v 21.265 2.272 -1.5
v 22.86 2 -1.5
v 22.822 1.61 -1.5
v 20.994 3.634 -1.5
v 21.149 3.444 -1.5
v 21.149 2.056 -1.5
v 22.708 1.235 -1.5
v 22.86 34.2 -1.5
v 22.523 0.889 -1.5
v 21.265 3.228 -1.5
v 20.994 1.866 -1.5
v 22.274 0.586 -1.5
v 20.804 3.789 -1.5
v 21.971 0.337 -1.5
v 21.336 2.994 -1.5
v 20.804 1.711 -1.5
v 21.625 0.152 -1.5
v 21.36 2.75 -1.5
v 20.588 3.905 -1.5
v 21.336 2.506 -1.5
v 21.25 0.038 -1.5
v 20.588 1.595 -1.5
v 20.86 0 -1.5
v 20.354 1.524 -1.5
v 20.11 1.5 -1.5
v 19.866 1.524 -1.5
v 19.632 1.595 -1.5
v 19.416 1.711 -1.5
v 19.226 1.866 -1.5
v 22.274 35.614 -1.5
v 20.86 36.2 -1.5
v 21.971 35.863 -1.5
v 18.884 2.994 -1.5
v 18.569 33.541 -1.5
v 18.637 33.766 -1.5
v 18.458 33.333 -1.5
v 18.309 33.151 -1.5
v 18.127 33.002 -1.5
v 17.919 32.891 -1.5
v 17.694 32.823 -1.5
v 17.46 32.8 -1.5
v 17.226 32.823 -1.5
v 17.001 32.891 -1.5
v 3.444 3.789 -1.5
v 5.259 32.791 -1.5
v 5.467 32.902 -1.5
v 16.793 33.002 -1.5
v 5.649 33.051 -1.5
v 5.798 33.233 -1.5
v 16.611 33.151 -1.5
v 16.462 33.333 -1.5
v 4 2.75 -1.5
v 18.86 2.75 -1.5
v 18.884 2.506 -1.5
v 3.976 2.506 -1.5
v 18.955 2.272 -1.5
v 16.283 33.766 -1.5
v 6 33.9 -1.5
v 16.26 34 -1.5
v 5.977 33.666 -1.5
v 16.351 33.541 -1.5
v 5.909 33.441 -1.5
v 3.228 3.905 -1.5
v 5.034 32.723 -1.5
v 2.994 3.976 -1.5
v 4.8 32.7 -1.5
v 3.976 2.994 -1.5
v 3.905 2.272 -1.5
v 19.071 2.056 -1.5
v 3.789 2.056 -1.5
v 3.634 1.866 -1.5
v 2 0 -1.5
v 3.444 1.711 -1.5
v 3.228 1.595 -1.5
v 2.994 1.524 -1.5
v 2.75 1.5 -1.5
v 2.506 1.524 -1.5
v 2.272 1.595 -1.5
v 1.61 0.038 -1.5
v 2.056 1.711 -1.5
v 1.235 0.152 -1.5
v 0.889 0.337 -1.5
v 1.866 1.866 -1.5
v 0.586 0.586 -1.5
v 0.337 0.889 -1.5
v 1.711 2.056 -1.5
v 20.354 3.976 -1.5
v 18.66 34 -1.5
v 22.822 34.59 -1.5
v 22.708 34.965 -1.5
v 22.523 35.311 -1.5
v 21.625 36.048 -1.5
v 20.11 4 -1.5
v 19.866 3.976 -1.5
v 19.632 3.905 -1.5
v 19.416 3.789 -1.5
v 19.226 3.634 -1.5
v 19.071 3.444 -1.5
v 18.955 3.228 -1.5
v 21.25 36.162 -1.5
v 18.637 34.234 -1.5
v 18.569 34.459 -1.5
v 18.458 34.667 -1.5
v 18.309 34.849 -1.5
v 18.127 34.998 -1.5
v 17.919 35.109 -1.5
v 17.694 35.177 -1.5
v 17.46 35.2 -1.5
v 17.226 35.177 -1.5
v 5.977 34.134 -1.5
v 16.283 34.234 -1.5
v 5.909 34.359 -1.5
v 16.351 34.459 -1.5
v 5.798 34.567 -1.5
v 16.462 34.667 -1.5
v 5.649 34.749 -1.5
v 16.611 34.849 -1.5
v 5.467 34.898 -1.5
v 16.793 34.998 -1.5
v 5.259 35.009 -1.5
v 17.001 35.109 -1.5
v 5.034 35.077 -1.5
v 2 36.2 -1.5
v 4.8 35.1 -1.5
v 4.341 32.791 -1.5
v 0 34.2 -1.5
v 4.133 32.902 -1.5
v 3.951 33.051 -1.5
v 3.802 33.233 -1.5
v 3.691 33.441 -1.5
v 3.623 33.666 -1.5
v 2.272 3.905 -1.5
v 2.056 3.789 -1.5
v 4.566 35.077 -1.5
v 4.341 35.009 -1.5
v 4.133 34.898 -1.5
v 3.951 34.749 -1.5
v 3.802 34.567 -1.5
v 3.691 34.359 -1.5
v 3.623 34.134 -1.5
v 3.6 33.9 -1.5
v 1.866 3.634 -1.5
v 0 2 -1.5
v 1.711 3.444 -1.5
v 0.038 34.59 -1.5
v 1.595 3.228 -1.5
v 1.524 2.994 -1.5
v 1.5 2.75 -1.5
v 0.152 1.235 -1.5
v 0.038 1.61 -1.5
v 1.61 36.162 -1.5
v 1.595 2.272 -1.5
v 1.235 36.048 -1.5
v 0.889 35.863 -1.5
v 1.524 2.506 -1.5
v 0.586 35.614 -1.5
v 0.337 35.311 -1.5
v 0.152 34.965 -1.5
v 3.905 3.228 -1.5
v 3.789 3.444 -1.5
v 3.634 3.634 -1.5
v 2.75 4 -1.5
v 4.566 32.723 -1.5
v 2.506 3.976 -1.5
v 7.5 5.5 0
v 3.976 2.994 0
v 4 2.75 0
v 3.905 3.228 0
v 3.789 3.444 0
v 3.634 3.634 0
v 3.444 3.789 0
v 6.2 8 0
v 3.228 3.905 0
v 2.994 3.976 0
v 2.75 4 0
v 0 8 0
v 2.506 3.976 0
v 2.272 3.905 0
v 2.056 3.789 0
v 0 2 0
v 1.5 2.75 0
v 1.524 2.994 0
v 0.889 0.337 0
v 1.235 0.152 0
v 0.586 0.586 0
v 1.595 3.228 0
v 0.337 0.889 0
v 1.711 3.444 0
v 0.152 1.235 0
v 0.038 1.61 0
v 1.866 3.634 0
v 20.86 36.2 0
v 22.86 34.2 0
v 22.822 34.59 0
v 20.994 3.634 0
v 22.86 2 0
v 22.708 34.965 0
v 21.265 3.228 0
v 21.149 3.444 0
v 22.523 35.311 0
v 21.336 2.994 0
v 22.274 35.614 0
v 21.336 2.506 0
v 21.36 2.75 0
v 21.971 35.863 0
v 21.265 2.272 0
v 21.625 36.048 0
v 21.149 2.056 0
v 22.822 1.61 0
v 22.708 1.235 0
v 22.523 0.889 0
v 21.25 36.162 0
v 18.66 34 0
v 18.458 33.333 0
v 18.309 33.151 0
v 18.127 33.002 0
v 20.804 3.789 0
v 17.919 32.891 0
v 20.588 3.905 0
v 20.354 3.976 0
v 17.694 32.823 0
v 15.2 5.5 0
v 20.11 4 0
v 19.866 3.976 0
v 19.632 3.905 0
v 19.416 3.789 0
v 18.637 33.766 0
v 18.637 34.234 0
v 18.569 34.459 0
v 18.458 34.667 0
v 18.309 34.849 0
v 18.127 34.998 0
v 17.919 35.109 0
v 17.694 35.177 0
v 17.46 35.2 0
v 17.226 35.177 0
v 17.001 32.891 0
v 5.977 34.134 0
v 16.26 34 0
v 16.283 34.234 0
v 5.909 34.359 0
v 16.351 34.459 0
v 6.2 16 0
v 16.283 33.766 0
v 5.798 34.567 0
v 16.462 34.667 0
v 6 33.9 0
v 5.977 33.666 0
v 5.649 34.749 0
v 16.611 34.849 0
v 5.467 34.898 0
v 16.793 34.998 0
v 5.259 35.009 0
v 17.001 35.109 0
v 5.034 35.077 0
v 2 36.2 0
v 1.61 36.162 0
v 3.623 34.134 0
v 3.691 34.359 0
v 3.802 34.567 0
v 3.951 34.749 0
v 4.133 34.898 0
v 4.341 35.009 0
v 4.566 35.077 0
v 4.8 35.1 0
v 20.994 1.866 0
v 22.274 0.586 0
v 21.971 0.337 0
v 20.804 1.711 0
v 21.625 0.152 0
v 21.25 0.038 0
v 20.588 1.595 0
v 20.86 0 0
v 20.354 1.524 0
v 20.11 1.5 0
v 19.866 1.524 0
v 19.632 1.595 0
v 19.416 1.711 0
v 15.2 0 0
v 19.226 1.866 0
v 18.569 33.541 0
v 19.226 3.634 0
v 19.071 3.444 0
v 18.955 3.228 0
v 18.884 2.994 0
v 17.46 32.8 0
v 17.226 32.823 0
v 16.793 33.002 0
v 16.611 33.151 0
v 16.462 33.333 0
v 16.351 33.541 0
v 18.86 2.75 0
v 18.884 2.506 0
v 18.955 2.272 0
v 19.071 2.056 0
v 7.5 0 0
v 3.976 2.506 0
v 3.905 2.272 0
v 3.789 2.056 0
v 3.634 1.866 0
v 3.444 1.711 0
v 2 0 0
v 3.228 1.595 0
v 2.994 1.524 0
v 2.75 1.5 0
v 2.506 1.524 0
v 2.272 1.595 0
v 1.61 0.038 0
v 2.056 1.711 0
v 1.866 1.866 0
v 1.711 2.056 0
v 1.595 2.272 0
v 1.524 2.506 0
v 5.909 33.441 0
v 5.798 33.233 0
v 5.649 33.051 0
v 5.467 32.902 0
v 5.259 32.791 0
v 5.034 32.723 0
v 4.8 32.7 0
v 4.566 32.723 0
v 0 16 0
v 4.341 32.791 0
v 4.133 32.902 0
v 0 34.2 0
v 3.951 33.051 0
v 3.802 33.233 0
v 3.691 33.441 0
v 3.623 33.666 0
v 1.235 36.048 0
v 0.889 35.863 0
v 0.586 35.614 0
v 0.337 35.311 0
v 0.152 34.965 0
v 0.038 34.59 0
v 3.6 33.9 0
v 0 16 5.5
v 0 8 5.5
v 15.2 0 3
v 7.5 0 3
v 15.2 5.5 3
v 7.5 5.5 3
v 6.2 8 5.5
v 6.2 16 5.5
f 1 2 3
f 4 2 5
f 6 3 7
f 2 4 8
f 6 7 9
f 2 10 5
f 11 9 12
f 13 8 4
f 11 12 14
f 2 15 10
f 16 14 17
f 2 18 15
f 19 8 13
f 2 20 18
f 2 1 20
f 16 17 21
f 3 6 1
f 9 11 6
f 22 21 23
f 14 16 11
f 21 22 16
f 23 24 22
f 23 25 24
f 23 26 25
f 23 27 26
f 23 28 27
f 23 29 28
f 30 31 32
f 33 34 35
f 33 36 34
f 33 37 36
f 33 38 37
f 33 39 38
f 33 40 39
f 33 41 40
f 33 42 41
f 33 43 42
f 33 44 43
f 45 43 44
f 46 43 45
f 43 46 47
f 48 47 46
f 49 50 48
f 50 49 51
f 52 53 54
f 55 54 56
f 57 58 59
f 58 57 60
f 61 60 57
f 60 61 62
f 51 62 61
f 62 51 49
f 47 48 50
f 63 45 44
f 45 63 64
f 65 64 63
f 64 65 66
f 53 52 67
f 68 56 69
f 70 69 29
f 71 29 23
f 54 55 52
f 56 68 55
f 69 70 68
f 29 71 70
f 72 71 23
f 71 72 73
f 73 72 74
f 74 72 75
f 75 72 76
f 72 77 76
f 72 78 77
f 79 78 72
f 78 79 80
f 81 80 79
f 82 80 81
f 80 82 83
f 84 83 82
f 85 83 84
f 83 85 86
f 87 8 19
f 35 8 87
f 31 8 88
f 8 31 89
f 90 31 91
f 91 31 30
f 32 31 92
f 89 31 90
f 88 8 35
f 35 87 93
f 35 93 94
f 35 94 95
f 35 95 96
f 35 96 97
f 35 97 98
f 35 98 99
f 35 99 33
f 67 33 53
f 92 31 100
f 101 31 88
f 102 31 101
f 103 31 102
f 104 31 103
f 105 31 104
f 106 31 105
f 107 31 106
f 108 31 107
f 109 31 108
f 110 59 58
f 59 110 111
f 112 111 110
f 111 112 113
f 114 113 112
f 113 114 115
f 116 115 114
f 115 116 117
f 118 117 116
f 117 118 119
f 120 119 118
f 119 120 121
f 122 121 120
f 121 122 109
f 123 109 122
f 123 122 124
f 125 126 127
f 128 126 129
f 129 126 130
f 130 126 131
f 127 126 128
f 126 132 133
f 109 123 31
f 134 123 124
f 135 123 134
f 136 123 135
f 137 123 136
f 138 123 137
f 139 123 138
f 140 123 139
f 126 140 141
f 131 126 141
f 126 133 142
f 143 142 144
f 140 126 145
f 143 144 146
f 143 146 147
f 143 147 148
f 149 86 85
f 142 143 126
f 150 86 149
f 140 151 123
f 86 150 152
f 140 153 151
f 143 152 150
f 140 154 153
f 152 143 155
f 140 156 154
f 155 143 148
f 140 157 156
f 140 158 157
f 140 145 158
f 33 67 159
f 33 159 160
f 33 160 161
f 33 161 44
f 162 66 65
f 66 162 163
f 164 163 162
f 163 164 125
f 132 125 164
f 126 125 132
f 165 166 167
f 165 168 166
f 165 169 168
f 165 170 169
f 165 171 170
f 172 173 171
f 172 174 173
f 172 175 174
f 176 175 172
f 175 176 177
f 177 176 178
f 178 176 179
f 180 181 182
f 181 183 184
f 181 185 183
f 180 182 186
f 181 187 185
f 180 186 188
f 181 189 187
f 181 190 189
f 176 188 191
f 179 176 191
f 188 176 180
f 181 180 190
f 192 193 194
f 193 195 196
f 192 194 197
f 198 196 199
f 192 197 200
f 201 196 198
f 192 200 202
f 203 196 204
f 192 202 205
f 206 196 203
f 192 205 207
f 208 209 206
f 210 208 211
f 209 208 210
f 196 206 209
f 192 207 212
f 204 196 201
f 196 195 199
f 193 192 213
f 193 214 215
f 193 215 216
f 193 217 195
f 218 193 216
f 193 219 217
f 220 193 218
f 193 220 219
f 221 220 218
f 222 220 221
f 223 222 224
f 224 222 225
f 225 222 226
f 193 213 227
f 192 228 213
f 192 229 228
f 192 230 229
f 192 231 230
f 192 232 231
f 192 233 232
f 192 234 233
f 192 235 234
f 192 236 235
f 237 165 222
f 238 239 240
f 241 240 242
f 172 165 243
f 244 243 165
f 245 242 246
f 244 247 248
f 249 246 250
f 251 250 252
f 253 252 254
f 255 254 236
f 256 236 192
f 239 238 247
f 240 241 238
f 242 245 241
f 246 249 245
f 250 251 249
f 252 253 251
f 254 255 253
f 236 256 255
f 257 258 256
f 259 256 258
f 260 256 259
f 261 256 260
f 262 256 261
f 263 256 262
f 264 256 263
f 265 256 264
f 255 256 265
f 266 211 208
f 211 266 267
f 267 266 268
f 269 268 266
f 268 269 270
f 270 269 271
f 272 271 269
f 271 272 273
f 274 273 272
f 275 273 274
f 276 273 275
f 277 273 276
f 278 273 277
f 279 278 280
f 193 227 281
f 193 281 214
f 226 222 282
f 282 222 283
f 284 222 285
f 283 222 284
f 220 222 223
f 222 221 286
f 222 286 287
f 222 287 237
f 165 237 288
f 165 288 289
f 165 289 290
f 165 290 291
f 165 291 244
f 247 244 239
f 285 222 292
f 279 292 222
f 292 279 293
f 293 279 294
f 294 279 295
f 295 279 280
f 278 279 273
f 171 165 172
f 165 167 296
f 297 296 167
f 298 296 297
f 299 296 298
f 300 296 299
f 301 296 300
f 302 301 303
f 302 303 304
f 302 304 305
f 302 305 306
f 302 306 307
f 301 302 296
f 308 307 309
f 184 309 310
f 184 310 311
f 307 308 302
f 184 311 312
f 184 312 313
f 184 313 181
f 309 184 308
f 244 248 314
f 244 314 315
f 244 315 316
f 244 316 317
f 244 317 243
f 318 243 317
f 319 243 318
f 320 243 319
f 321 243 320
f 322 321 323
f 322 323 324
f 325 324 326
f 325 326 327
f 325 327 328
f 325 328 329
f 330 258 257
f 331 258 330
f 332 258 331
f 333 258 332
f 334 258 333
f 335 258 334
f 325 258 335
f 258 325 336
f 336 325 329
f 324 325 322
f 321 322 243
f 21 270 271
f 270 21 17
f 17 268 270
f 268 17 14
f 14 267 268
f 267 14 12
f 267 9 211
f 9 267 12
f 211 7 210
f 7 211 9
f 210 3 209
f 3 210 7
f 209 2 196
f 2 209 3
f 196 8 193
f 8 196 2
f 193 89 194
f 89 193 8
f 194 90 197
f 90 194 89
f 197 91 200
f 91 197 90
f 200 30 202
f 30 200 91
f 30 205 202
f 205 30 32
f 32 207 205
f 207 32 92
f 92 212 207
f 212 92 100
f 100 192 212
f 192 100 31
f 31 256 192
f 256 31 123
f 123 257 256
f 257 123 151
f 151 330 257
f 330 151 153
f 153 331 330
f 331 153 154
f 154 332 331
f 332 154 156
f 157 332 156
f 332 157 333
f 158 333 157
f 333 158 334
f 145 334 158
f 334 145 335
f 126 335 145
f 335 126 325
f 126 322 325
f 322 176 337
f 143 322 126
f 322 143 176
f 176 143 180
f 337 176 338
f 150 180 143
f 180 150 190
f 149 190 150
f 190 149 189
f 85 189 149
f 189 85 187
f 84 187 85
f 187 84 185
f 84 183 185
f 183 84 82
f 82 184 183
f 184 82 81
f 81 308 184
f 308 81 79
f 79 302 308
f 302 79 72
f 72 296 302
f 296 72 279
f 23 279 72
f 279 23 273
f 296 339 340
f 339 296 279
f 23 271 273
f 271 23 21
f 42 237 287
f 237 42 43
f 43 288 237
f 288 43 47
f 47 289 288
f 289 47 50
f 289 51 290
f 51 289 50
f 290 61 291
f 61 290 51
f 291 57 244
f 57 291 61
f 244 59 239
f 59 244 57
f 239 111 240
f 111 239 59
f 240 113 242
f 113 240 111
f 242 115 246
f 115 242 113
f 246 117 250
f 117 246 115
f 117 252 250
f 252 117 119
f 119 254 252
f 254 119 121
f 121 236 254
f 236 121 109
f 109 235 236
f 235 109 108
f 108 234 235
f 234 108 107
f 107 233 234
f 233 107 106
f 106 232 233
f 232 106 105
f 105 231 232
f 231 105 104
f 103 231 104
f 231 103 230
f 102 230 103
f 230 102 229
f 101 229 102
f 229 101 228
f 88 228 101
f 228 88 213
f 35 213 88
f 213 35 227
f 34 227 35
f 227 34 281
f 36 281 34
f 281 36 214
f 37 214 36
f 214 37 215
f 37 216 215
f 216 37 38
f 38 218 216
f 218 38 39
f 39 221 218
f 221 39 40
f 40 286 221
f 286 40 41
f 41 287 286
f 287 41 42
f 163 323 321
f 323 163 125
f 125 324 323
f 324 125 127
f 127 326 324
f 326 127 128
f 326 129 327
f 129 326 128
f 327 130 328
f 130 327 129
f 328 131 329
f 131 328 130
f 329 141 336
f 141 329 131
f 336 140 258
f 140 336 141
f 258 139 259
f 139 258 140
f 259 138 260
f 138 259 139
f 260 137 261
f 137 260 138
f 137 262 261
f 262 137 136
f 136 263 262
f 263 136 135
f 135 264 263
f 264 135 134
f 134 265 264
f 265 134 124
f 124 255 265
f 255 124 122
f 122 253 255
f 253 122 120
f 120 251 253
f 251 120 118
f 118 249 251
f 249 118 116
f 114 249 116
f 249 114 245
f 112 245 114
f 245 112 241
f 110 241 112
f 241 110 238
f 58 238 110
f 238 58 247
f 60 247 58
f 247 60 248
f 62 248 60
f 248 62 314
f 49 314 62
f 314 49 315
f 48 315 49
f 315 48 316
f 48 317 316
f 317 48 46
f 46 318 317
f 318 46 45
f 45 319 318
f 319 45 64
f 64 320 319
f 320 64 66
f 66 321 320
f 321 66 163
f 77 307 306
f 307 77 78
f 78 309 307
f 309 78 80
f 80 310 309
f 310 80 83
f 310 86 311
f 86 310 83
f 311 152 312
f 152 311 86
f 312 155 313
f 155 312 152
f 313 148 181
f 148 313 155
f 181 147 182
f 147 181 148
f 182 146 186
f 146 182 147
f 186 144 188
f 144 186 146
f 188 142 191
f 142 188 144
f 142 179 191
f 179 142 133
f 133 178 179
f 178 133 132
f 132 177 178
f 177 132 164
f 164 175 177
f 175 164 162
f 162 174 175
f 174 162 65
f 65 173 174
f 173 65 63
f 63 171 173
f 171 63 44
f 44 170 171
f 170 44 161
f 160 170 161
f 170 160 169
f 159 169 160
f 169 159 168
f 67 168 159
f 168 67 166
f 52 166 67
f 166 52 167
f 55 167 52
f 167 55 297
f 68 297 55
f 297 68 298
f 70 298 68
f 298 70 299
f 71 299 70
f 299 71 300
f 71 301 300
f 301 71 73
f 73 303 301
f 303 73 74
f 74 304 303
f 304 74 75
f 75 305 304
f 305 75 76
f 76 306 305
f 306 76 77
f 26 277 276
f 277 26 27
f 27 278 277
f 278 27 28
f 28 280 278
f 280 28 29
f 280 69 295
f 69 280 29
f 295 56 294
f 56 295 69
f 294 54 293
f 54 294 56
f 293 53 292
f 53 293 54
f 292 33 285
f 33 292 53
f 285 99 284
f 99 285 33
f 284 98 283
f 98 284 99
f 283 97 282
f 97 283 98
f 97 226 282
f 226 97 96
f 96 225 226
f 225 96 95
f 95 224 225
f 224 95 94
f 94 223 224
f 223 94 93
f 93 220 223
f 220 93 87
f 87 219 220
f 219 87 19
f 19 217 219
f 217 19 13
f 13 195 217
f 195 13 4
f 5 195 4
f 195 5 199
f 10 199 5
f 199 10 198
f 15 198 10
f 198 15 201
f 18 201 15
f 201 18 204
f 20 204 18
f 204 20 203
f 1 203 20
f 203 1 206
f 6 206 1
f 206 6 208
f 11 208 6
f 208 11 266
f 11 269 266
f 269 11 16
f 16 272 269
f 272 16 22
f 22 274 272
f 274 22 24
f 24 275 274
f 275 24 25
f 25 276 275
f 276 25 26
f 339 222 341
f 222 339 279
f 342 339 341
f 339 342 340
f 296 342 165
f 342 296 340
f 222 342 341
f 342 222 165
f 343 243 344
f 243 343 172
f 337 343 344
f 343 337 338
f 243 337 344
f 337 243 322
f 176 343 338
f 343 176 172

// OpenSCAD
// file: util.scad
module micro_usb() {
    color("grey")
    cube([7.7,5.5,3]);
}

micro_usb();

module header(x_max,y_max) {
    union() {
        for(x=[0:x_max-1]) {
            for(y=[0:y_max-1]) {
                translate([x*2.5,y*2.5]) {
                    color("black")
                        cube([2.5,2.5,2.5]);
                    color("gold")
                        translate([(2.5 - 0.65)/2,(2.5 - 0.65)/2,-2.5])
                        cube([0.65,0.65,11.6]);
                }
            }
        }
    }
}

translate([0,8,0])
    header(2,13);

module sdcard() {

    color("red")
        cube([11,15,0.75]);
}
translate([10,0,0])
    sdcard();

module sdcard_reader() {
    color("grey")
        cube([12,11.65,1.5]);
}
translate([9.5,-0.4,0])
    sdcard_reader();

module hdmi() {
    color("grey")
        cube([11,15,5.6]);

}

translate([30,0,0])
    hdmi();

module usb() {
    color("grey")
    cube([14,14,5.85]);

}

translate([10,20,0])
    usb();

module audio() {
    $fn=30;
    color("black")
        union() {
            cube([7,12.6,6]);
            translate([7/2,14.5,3])
                rotate([90,0,0])
                cylinder(d=6,h=2.5);
        }
}

translate([30,30,0])
    audio();
// main file
use <util.scad>;

// https://learn.adafruit.com/adafruit-powerboost-1000c-load-share-usb-charge-boost/downloads


module powerboost() {
    $fn=32;
    width=22.86;
    length=36.2;

    pcb_height = 1.5;

    color("blue")
        translate([0,0,-pcb_height])
        linear_extrude(pcb_height)
        difference() {
            hull() {
                translate([2,2]) circle(r=2);
                translate([width-2,2]) circle(r=2);
                translate([width-2,length-2]) circle(r=2);
                translate([2,length-2]) circle(r=2);
            }
            // front holes are 2.5
            translate([2.75,2.75]) circle(d=2.5);
            translate([width-2.75,2.75]) circle(d=2.5);

            // back holes are 2.4
            translate([4.8,length-2.3]) circle(d=2.4);
            translate([width-5.4,length-2.2]) circle(d=2.4);
        }

    translate([7.5, 0, 0]) micro_usb();
    color("black")
        translate([0,8,0])
        cube([6.2,8,5.5]);
}

powerboost();
